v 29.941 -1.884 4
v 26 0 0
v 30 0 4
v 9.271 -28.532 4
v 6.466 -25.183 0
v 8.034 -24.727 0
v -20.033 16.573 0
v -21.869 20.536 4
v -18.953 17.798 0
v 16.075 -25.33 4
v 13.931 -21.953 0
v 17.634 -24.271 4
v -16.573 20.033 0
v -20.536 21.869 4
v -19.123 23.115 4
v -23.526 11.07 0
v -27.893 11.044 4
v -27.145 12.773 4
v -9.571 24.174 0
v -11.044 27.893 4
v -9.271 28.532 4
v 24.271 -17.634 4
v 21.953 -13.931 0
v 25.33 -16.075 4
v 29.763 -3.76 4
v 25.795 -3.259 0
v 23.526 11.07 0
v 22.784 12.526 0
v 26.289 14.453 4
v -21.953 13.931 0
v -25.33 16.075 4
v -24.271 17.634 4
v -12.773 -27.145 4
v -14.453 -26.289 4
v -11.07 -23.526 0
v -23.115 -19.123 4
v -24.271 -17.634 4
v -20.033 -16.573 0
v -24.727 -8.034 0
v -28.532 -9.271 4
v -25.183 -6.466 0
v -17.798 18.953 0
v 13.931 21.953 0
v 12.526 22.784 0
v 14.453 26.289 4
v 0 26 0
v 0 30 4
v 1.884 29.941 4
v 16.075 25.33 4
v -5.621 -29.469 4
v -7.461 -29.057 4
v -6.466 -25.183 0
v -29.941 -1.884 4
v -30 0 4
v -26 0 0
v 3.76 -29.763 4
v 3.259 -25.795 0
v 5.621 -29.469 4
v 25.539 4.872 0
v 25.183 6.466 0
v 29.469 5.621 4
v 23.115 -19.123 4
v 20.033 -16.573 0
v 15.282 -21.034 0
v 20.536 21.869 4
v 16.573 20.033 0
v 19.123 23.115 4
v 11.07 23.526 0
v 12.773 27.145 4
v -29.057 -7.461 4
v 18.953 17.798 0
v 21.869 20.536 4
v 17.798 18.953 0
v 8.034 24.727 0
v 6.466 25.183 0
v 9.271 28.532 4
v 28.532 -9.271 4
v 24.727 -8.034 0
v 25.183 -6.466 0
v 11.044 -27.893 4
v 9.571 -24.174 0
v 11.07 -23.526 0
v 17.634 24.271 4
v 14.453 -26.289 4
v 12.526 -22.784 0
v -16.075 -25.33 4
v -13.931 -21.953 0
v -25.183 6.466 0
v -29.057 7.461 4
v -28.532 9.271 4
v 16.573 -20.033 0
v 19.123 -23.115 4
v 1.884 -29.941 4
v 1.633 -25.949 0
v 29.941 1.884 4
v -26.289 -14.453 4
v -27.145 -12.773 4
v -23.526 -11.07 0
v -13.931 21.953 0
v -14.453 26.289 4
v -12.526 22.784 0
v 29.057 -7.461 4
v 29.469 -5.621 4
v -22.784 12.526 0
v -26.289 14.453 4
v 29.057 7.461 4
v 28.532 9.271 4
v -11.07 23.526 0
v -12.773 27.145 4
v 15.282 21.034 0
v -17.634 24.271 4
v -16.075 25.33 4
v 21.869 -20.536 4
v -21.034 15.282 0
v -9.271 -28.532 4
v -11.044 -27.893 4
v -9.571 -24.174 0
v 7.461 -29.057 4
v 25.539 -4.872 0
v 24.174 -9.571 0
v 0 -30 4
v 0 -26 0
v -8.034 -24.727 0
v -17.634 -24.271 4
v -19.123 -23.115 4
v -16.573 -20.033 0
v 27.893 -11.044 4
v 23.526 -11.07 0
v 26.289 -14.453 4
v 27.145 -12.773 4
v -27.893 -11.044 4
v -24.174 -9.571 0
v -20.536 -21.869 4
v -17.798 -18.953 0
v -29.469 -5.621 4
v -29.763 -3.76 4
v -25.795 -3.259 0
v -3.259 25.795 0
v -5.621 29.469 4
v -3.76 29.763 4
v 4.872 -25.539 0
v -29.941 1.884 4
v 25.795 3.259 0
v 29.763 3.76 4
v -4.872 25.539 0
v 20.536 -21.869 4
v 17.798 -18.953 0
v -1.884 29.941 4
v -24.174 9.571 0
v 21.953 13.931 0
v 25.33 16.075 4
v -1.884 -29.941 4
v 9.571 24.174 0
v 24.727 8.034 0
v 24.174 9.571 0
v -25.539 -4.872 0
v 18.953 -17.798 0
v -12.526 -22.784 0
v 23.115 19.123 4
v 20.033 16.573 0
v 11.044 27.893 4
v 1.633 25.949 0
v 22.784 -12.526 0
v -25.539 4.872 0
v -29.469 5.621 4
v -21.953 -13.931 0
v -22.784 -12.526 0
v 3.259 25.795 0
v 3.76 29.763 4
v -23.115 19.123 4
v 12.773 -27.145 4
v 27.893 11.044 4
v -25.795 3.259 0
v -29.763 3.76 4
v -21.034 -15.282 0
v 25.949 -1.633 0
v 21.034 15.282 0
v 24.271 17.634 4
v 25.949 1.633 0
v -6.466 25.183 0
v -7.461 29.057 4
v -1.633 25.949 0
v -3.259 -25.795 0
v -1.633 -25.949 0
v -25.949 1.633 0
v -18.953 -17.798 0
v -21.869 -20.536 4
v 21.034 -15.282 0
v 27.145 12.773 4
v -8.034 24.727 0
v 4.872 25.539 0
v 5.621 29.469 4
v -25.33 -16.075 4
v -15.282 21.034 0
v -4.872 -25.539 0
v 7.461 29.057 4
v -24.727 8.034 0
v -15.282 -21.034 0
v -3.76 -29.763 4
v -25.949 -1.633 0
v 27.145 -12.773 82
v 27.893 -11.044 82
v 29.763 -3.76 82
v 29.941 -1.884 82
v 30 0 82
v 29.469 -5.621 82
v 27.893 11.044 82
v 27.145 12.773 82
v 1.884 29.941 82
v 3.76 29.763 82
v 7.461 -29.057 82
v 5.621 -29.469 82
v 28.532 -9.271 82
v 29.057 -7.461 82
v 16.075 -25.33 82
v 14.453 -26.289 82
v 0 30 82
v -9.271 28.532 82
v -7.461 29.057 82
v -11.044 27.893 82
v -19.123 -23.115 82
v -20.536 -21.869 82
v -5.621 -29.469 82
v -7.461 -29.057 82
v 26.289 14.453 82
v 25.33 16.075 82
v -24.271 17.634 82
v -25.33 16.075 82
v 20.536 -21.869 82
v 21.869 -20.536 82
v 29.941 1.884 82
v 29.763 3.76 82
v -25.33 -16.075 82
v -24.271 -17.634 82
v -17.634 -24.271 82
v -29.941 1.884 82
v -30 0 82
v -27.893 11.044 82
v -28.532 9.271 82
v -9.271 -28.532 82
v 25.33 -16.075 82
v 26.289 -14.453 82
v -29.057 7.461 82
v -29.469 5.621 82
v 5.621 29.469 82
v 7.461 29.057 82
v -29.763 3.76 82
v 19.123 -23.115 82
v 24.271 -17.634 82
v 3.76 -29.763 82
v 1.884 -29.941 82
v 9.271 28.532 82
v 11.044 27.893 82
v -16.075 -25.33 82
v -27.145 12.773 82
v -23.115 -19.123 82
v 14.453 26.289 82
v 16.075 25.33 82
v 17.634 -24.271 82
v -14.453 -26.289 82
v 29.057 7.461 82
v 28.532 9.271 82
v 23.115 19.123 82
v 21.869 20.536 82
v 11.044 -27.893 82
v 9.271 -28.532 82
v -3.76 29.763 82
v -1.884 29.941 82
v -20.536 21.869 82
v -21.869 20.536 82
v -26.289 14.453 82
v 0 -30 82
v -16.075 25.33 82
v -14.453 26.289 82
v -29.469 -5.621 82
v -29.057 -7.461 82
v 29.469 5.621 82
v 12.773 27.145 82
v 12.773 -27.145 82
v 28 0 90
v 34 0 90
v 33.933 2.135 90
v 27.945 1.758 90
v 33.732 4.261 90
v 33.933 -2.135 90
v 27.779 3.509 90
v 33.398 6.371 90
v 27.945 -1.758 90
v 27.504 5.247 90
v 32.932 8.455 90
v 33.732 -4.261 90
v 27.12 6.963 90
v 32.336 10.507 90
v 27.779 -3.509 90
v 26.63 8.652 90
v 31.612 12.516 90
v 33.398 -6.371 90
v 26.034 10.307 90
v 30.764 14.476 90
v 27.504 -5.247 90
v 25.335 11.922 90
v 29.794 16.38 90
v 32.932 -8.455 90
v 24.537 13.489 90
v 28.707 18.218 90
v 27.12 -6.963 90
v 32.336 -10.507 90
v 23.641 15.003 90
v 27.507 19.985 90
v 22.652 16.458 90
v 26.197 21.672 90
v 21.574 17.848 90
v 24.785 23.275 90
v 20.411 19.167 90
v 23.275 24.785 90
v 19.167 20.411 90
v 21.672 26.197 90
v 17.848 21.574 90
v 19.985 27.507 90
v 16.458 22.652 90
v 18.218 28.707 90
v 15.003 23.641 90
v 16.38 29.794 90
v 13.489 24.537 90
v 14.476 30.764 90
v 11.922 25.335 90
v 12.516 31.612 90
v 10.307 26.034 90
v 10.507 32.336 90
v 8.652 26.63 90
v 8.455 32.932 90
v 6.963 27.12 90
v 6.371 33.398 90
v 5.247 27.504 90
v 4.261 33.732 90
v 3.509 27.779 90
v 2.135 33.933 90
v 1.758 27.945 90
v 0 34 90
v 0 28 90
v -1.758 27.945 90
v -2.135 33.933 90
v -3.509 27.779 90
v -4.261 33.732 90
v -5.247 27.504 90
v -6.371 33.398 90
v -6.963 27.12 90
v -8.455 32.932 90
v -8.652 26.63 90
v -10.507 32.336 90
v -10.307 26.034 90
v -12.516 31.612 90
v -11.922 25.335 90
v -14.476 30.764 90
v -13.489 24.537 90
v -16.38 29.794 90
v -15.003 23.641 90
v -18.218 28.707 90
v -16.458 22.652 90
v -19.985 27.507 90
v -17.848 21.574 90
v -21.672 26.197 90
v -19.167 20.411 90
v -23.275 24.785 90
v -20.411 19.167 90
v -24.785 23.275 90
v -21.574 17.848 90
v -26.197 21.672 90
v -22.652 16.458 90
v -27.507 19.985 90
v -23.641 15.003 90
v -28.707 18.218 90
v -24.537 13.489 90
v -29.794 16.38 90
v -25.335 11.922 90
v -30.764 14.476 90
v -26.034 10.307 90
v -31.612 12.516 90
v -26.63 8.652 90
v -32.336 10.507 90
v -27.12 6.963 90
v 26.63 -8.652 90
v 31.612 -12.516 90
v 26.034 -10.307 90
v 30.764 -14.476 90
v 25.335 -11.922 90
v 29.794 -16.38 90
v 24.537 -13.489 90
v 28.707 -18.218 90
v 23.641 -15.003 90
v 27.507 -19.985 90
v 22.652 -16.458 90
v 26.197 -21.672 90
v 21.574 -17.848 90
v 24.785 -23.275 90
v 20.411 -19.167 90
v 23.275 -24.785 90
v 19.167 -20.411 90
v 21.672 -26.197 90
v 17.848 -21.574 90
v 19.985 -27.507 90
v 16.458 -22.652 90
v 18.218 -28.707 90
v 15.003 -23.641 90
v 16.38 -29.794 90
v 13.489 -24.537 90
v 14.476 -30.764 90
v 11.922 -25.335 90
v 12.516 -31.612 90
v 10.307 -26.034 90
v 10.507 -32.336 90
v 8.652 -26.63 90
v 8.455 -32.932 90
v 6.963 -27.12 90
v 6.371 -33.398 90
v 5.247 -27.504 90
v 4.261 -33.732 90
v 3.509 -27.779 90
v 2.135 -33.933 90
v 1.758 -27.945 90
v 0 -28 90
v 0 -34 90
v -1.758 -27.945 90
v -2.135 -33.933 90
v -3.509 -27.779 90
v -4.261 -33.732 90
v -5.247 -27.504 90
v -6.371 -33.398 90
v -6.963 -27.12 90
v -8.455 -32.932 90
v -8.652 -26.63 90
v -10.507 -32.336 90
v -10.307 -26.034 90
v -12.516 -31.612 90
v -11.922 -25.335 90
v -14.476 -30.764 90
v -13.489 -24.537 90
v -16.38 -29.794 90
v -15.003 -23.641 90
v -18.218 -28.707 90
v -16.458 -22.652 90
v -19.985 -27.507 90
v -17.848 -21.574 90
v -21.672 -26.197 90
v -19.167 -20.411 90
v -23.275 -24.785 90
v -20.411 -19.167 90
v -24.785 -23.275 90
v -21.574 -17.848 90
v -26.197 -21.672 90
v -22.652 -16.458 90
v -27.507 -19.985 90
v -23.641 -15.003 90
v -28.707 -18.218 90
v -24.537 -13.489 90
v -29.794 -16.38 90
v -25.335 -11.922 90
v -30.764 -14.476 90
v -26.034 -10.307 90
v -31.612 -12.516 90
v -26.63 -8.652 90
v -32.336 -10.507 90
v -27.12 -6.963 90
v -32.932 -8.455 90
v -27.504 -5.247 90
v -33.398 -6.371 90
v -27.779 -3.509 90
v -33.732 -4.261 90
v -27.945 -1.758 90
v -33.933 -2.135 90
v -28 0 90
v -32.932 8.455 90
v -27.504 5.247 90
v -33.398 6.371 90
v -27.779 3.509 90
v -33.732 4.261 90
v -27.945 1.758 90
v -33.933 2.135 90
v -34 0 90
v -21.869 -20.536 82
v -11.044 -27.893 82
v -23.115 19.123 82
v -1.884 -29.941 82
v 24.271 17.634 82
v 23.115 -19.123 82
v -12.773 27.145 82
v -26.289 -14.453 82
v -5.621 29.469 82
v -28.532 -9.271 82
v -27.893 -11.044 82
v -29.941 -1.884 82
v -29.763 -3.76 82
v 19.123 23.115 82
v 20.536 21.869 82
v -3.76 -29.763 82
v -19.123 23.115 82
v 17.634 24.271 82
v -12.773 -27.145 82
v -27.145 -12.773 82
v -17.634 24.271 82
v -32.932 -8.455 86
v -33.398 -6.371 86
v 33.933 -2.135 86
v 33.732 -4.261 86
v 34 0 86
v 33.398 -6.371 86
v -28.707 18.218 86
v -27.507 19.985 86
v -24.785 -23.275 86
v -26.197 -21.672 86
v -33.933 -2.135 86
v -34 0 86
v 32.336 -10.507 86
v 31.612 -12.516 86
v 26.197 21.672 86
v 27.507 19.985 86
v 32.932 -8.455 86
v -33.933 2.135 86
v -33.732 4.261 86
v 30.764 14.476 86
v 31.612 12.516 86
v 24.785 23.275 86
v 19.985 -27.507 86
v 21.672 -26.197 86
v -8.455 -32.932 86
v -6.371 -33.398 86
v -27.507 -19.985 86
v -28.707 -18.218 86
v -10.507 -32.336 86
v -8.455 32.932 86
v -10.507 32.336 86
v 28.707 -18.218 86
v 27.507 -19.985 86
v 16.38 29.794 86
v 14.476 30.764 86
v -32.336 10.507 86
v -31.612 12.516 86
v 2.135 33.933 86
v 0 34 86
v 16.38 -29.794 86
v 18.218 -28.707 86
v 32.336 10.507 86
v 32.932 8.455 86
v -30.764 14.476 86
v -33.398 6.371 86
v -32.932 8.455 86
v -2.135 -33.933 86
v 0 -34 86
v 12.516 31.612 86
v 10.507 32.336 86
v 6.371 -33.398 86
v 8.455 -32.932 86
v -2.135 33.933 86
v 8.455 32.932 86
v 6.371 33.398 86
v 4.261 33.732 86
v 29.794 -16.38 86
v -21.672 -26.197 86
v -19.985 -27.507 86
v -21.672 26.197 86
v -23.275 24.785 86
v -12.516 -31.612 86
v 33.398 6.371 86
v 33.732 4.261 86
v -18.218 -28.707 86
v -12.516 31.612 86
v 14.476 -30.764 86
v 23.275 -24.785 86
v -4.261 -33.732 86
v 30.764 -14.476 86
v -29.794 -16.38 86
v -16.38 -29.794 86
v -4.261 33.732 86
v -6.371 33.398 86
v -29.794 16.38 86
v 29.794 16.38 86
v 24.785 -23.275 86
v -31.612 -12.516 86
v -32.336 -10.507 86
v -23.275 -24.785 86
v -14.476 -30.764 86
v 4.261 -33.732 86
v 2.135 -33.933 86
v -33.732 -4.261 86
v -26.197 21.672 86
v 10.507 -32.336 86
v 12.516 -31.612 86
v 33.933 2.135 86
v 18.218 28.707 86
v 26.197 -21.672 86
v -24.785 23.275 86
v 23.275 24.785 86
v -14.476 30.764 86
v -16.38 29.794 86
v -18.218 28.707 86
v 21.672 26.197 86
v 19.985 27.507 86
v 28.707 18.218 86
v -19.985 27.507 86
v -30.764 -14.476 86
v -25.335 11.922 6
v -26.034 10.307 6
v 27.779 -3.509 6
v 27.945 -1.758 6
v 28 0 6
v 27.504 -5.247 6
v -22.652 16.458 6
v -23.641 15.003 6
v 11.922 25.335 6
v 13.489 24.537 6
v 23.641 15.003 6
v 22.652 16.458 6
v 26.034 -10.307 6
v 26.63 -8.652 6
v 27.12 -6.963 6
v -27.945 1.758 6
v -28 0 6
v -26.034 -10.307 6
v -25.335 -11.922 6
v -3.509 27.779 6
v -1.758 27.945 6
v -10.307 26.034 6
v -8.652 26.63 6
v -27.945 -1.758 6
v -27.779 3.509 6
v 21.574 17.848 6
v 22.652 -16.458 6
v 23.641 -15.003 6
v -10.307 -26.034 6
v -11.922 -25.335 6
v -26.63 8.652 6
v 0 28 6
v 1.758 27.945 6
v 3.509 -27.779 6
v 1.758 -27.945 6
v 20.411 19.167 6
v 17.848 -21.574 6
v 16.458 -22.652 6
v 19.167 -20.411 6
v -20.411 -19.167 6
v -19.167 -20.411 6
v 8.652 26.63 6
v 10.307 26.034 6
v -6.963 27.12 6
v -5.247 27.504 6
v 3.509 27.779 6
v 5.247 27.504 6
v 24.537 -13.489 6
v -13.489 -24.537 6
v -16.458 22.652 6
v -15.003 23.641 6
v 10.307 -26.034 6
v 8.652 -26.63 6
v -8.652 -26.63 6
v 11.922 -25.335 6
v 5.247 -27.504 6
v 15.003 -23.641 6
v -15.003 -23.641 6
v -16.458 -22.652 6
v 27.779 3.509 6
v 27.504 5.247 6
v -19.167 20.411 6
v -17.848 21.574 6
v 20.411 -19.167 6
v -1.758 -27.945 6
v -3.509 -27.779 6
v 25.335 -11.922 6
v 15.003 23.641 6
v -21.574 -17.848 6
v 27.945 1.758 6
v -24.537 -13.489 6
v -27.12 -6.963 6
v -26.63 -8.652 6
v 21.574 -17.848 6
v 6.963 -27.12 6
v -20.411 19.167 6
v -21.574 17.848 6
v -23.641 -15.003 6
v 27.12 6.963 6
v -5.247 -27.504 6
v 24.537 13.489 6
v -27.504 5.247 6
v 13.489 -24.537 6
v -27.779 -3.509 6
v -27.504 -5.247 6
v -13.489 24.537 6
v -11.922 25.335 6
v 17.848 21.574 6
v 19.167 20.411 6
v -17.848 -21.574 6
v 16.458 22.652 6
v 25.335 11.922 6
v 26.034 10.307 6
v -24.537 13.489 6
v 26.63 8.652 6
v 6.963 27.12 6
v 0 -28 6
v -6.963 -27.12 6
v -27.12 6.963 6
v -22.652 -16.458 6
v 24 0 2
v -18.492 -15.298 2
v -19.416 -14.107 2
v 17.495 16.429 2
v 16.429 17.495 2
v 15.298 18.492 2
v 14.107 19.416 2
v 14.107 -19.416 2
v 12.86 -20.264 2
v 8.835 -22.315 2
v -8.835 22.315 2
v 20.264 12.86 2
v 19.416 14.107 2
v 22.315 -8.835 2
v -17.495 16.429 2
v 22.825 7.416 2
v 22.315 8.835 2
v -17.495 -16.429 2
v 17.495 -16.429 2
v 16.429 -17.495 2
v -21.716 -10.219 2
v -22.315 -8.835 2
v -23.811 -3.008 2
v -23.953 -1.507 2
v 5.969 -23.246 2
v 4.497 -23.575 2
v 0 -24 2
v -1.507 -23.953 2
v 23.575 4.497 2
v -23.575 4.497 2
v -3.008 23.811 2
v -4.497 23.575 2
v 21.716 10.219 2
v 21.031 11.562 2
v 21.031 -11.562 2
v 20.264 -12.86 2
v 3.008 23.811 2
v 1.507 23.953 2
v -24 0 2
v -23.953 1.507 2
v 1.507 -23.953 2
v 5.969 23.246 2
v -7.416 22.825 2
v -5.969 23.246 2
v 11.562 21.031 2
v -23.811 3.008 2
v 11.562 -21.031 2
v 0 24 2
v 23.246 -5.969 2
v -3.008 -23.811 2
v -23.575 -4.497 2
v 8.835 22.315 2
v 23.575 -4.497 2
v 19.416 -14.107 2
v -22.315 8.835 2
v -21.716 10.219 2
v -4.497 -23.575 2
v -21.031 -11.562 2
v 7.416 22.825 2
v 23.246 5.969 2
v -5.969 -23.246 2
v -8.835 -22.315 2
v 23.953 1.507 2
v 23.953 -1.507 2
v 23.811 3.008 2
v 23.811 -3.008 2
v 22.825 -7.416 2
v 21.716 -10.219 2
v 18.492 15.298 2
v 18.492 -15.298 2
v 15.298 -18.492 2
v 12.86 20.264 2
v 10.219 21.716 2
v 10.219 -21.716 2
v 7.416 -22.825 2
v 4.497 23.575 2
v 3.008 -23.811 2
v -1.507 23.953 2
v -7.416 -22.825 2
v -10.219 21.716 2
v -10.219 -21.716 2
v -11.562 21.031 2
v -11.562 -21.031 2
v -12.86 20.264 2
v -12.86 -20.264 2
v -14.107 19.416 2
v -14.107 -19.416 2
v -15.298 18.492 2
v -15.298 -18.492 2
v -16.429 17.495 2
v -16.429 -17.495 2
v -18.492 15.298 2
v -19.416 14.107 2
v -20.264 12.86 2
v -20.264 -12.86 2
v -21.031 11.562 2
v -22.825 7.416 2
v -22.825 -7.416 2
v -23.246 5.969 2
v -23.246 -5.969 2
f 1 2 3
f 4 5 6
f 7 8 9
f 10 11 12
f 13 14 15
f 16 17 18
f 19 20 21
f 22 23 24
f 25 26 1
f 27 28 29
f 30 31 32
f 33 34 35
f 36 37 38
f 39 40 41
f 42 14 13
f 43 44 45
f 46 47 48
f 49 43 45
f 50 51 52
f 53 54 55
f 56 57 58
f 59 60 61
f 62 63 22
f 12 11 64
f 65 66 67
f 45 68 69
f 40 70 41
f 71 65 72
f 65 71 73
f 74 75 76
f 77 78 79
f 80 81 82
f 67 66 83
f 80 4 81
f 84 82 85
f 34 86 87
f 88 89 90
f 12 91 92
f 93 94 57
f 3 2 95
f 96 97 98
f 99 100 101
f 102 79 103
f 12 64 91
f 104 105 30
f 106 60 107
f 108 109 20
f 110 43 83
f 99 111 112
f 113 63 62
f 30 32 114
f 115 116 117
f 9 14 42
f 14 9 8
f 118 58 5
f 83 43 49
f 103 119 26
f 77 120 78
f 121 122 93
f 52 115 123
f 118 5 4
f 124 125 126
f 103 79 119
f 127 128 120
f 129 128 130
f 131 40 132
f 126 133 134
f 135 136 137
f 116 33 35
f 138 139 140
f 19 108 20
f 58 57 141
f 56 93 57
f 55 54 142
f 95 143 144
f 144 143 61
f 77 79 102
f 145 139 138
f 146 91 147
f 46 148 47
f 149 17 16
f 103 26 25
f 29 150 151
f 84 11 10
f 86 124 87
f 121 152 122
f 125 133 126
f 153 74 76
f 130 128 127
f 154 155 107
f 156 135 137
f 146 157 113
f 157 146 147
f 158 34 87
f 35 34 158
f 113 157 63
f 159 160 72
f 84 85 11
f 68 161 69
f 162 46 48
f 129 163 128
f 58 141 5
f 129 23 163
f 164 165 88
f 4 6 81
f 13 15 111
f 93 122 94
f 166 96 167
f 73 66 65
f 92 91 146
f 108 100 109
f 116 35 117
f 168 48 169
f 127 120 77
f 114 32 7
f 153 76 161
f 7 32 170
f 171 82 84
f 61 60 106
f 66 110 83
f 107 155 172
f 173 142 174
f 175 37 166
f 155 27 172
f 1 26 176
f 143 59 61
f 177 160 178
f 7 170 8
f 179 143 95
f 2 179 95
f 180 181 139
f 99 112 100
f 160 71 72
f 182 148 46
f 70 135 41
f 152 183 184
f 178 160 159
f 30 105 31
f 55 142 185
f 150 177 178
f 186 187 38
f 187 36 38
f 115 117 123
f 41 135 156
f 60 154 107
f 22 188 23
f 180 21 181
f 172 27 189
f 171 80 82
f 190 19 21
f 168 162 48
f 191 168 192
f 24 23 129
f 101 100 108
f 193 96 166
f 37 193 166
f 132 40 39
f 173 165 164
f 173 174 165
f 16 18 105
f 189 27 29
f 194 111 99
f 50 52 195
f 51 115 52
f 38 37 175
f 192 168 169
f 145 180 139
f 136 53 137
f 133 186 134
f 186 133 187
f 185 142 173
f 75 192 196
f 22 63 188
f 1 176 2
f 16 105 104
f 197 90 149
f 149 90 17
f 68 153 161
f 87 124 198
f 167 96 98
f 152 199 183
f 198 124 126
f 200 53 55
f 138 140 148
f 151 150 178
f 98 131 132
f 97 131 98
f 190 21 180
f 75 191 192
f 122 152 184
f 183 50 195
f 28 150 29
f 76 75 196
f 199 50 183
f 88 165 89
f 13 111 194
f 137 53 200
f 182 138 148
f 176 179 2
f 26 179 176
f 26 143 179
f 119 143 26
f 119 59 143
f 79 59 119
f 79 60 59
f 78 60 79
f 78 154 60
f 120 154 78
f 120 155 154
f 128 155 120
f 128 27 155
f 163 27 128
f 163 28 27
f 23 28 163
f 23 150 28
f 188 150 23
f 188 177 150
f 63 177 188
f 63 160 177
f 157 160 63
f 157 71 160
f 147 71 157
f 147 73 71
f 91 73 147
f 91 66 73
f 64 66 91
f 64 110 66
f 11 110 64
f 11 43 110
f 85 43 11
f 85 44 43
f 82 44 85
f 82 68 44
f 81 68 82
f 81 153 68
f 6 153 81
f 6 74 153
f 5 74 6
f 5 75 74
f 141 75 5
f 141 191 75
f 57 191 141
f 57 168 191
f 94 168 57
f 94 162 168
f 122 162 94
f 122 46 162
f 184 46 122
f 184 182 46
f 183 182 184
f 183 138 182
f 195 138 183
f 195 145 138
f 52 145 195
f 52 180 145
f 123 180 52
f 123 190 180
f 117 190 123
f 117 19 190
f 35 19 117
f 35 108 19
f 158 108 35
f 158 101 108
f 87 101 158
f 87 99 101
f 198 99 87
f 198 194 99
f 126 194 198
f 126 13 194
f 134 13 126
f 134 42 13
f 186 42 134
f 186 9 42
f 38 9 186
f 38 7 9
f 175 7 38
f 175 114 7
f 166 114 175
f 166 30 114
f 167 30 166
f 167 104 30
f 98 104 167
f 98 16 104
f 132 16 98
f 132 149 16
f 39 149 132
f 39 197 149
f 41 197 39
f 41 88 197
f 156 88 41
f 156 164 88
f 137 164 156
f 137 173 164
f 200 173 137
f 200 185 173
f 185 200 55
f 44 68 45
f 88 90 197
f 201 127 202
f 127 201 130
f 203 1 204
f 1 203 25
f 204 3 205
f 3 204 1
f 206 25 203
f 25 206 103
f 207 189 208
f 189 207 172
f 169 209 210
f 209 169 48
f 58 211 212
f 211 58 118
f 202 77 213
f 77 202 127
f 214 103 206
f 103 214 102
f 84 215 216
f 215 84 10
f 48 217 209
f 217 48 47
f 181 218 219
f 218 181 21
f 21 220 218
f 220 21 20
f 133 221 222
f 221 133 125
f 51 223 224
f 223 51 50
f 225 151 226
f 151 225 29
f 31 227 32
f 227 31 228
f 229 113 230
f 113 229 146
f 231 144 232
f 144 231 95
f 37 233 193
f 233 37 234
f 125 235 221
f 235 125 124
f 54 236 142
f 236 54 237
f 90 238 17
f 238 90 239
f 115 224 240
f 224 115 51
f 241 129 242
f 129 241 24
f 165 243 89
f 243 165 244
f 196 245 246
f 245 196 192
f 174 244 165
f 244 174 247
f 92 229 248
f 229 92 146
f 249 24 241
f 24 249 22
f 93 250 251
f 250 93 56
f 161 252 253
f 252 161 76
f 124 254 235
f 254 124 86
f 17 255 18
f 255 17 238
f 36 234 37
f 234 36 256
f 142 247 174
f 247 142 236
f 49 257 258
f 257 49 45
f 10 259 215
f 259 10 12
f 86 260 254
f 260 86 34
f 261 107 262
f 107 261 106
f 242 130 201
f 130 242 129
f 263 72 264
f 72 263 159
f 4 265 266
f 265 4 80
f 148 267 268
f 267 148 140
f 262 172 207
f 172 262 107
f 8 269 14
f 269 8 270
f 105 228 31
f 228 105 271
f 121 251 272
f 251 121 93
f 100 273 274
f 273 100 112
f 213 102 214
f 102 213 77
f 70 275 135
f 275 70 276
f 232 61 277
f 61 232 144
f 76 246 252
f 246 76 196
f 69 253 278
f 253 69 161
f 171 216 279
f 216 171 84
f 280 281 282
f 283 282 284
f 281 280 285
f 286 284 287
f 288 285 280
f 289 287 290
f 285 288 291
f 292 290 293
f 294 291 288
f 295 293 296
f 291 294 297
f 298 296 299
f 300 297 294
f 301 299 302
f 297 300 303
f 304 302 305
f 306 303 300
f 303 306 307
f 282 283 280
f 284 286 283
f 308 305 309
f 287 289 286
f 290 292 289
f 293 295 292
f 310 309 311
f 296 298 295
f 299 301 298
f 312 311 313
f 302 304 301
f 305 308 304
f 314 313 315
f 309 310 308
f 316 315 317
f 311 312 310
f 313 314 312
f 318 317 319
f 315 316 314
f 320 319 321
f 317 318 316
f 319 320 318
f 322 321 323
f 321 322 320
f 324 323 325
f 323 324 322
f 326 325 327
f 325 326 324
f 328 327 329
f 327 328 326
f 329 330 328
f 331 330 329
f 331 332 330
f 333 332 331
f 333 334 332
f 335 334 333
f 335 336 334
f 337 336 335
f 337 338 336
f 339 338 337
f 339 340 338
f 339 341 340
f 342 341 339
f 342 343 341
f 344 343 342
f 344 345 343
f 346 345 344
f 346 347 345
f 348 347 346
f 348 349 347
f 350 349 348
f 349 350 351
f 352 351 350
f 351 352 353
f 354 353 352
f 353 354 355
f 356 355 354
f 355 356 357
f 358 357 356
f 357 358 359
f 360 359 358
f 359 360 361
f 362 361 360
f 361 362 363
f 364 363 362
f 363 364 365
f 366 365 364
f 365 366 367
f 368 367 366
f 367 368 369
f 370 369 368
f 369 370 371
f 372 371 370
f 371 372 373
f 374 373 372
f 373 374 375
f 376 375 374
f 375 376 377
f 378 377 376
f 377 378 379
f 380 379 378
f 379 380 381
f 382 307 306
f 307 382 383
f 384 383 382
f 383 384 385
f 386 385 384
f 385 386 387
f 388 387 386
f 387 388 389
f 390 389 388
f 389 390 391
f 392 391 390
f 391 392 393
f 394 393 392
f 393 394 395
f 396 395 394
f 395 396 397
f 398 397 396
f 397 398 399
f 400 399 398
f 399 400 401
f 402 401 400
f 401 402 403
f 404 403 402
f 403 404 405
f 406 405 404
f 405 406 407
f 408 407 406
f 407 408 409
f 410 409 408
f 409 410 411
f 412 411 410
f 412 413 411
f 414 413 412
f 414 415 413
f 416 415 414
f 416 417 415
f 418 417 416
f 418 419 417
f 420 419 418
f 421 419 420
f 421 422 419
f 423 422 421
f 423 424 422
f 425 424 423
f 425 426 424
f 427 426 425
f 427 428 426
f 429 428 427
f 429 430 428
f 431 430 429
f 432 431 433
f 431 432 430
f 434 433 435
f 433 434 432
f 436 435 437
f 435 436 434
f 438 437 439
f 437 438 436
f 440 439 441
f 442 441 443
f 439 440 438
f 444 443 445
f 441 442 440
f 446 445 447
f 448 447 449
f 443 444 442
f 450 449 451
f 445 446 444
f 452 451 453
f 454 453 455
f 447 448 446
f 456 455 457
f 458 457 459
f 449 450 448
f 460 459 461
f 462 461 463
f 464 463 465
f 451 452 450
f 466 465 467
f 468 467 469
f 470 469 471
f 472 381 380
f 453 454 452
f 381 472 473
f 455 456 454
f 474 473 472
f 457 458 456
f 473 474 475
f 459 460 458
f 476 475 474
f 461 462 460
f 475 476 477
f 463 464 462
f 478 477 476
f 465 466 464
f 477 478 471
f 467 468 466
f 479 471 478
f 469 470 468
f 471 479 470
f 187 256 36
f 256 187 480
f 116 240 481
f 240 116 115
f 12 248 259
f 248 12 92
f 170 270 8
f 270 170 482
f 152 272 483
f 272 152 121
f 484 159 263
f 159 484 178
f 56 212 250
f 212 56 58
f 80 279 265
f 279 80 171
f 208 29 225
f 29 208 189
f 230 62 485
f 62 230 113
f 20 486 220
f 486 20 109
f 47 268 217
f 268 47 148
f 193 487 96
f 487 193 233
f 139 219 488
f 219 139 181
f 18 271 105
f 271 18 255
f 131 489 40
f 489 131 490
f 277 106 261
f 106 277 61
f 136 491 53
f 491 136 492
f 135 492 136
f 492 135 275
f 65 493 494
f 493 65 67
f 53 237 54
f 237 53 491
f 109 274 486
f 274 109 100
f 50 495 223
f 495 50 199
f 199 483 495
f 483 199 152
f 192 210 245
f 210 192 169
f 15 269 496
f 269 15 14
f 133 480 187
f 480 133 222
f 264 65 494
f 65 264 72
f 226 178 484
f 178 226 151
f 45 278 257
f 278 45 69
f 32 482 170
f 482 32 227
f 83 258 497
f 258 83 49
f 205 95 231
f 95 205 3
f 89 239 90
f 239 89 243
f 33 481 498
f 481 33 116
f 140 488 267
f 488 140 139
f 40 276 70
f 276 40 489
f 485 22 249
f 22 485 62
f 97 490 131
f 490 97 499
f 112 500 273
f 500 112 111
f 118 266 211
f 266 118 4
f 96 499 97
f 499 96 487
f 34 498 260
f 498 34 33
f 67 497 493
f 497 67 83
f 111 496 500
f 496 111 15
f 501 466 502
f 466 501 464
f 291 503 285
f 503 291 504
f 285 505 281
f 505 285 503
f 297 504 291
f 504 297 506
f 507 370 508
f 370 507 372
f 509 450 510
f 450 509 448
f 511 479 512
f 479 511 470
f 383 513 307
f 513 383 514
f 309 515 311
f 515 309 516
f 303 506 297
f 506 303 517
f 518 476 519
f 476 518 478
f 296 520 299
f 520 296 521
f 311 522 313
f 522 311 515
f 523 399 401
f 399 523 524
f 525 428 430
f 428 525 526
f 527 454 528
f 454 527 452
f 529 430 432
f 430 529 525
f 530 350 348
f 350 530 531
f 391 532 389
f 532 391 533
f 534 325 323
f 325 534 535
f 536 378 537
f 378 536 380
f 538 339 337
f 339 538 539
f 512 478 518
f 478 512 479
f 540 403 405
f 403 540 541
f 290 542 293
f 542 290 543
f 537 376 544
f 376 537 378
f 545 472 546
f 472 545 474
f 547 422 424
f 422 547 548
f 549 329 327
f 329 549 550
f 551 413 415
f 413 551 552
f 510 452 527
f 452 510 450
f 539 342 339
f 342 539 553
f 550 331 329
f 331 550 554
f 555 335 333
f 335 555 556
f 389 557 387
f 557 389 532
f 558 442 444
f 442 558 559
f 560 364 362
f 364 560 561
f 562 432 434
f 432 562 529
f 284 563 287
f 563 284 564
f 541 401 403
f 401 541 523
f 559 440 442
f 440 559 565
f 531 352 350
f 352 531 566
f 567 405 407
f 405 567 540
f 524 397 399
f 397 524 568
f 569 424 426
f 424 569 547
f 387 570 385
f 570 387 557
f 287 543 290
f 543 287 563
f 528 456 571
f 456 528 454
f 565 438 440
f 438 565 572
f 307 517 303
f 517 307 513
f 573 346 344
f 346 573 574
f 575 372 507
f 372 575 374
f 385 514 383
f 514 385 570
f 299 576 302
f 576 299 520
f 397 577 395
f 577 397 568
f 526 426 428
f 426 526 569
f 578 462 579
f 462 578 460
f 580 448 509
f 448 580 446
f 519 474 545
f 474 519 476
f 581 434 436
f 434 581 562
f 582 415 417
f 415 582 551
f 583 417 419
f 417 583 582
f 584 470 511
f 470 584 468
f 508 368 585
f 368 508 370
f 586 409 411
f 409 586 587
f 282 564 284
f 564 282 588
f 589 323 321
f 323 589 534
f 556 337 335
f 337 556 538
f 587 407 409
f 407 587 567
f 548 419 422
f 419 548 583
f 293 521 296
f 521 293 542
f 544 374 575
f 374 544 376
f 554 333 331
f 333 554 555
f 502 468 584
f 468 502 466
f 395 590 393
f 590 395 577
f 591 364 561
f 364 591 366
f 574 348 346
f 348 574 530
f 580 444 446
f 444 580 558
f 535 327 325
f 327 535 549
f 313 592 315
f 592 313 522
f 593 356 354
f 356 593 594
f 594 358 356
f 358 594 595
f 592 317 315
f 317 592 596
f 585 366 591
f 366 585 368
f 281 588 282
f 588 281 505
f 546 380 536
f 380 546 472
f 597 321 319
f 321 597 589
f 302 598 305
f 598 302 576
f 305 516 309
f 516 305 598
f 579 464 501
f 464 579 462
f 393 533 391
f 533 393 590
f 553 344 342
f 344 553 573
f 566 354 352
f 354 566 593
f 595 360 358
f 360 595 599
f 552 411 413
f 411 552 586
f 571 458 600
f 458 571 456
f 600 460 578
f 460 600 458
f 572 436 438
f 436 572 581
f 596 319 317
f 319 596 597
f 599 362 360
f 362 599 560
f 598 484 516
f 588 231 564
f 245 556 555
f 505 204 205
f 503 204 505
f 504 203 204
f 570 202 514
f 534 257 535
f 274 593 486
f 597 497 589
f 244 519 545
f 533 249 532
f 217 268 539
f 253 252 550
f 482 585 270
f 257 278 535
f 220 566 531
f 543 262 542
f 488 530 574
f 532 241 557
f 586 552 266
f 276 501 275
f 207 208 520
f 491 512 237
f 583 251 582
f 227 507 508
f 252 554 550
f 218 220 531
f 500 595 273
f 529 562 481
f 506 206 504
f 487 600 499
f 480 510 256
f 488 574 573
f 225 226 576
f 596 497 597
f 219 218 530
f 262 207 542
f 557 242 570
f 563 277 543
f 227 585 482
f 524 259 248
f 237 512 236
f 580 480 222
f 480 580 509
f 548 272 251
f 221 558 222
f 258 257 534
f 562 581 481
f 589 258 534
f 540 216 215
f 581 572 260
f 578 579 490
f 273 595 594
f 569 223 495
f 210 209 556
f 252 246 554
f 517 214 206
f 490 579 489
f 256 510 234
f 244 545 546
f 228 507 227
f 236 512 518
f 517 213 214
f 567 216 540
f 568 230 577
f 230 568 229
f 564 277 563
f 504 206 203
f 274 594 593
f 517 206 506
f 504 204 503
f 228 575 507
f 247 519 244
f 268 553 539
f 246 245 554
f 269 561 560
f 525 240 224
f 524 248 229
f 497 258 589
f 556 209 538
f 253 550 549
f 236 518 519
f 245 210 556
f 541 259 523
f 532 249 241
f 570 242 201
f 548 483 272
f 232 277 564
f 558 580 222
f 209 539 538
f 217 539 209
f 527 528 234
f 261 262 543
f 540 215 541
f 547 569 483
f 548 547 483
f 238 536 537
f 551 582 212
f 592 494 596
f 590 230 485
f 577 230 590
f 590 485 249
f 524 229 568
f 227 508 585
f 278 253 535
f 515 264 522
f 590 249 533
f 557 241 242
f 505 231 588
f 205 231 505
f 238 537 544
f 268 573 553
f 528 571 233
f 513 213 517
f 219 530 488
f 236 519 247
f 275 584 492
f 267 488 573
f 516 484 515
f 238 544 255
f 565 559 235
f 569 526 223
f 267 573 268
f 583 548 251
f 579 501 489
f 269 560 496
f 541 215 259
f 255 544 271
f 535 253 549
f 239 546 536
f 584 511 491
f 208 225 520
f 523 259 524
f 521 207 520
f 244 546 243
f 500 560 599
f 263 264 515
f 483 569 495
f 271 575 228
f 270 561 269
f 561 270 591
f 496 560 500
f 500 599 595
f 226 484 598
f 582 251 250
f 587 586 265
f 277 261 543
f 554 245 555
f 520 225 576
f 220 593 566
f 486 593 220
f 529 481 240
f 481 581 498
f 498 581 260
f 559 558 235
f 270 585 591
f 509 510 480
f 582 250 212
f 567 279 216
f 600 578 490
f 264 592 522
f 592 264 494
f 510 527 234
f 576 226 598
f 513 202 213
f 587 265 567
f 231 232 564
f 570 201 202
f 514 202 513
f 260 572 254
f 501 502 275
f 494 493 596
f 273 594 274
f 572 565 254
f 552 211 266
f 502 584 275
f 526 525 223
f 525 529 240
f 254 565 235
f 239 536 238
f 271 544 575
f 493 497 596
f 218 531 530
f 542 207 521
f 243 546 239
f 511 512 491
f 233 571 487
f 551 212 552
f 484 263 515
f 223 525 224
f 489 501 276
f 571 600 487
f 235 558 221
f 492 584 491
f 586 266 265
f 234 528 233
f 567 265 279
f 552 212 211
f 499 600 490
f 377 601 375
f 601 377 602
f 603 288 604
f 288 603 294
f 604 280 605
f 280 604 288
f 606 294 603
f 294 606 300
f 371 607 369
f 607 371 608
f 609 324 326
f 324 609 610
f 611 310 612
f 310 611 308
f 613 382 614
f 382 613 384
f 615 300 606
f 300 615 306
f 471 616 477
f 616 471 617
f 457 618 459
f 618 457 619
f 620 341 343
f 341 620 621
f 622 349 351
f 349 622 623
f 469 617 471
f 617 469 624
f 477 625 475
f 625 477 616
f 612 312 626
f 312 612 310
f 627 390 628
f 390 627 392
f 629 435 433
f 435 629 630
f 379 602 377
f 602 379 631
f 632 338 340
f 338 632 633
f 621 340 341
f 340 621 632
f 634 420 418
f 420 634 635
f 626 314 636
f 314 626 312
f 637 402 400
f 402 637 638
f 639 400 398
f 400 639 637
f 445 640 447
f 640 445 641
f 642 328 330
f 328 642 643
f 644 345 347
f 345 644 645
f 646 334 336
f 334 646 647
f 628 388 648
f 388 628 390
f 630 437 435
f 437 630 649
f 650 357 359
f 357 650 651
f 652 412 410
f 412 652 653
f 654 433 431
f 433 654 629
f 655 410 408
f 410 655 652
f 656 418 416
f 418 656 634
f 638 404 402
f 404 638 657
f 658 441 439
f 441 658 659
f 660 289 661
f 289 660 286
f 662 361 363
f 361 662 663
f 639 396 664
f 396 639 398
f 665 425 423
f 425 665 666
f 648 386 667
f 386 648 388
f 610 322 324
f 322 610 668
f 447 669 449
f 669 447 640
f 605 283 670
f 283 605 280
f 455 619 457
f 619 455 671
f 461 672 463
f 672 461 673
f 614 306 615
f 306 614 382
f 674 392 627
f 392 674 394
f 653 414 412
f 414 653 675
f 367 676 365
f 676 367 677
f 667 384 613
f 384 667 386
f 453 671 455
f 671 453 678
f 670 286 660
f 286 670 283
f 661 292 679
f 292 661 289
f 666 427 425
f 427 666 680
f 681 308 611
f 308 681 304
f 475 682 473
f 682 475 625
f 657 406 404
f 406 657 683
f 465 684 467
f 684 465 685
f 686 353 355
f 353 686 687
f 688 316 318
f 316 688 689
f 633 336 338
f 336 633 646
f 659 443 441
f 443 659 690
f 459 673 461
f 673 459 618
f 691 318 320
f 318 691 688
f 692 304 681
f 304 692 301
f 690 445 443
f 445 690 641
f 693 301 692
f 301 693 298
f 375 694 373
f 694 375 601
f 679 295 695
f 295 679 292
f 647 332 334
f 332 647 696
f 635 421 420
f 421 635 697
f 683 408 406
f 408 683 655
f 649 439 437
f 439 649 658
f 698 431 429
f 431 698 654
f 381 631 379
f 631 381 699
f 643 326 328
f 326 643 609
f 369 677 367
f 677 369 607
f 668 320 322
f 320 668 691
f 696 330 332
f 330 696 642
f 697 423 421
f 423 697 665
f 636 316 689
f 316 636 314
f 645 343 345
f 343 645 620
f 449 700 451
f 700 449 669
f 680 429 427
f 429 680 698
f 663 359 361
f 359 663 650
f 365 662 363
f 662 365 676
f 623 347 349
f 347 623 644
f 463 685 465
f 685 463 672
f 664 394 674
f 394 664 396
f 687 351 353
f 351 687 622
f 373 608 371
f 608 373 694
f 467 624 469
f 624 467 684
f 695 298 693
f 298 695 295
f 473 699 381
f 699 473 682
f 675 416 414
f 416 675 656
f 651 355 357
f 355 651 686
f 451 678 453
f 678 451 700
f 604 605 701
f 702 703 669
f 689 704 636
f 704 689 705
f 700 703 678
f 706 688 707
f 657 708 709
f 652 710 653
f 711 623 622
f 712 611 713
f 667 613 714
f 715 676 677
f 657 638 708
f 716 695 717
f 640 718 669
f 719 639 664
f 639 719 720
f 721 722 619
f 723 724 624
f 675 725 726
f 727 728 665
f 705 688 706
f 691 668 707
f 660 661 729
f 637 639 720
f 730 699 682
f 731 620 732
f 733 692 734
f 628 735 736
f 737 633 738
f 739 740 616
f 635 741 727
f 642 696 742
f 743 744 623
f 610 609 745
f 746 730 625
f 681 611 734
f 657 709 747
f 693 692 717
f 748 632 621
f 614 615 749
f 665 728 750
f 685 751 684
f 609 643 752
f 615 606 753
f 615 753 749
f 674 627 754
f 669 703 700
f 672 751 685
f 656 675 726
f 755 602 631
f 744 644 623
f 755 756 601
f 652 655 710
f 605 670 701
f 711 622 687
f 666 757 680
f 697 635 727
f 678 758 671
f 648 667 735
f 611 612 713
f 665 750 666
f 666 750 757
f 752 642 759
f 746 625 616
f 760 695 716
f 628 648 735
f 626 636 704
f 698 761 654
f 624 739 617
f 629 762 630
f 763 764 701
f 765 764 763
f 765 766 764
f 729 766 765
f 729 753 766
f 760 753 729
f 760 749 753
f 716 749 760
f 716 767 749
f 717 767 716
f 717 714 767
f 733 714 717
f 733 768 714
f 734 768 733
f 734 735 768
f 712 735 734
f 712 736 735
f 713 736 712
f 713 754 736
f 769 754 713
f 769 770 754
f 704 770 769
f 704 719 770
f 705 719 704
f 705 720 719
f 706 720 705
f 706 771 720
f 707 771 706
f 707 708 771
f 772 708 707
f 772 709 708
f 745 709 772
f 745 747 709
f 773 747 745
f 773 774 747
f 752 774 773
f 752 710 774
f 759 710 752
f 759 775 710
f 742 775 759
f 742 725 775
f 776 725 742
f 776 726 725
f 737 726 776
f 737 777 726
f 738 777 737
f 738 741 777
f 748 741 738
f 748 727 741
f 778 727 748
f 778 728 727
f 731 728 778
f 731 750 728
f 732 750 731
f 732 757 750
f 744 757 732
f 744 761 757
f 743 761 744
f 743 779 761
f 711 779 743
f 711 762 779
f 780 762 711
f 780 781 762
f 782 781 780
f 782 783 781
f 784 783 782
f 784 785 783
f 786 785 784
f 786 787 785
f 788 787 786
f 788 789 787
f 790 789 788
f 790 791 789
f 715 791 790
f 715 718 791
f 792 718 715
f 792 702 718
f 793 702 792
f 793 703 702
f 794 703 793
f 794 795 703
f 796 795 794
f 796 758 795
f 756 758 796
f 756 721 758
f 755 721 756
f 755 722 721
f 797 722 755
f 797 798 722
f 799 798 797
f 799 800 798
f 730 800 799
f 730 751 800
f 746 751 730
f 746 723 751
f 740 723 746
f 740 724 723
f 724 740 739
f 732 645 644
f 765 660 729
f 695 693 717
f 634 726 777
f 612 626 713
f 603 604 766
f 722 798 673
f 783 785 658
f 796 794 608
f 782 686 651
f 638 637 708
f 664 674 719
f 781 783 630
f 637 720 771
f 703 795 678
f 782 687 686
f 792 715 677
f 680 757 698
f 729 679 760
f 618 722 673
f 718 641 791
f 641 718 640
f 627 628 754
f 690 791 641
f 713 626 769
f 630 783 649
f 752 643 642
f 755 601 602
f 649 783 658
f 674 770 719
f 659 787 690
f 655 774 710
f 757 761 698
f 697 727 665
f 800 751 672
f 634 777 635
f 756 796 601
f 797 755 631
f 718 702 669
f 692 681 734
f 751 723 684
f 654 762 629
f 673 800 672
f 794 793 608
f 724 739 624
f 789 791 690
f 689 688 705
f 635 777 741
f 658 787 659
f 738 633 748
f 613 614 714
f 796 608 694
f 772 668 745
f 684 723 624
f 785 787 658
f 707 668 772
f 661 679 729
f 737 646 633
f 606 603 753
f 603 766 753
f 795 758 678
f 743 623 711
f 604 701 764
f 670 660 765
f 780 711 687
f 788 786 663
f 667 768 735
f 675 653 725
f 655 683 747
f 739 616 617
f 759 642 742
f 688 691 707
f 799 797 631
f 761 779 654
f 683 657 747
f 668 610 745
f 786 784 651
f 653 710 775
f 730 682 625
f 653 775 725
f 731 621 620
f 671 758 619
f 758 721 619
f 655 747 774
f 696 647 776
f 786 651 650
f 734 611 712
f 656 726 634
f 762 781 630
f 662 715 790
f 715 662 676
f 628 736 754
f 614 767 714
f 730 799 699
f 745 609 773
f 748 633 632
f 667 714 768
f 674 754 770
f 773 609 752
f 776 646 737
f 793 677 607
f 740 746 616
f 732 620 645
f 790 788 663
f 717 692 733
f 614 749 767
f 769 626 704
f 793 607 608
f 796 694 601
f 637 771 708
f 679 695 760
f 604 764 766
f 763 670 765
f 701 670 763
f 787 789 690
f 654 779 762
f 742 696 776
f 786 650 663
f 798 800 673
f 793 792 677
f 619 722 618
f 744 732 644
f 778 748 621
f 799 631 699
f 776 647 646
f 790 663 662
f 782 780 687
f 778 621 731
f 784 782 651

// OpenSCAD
stand_height = 90;
leg_radius = 30;
foot = 4;
border = 2;
tolerance = 1;
$fn = 100;

module stand(order)
{
    // real leg radius
    rlr = leg_radius-order*(border+tolerance);
    difference()
    {
        union()
        {
            translate([0, 0, stand_height-foot])
                cylinder(foot, rlr, rlr-foot);
            cylinder(stand_height-foot, rlr, rlr);
            cylinder(foot, rlr+foot, rlr+foot);
            translate([0, 0, foot])
                cylinder(foot, rlr+foot, rlr);
        }
        cylinder(stand_height-foot-border, rlr-border, rlr-border);
        translate([0, 0, stand_height-foot-border])
            cylinder(foot, rlr-border, rlr-border-foot);
    }
}

translate([0, 0, stand_height]) rotate([180, 0, 0]) stand(0);
//translate([0, 0, stand_height]) rotate([180, 0, 0]) stand(1);
//translate([0, 0, stand_height]) rotate([180, 0, 0]) stand(2);
